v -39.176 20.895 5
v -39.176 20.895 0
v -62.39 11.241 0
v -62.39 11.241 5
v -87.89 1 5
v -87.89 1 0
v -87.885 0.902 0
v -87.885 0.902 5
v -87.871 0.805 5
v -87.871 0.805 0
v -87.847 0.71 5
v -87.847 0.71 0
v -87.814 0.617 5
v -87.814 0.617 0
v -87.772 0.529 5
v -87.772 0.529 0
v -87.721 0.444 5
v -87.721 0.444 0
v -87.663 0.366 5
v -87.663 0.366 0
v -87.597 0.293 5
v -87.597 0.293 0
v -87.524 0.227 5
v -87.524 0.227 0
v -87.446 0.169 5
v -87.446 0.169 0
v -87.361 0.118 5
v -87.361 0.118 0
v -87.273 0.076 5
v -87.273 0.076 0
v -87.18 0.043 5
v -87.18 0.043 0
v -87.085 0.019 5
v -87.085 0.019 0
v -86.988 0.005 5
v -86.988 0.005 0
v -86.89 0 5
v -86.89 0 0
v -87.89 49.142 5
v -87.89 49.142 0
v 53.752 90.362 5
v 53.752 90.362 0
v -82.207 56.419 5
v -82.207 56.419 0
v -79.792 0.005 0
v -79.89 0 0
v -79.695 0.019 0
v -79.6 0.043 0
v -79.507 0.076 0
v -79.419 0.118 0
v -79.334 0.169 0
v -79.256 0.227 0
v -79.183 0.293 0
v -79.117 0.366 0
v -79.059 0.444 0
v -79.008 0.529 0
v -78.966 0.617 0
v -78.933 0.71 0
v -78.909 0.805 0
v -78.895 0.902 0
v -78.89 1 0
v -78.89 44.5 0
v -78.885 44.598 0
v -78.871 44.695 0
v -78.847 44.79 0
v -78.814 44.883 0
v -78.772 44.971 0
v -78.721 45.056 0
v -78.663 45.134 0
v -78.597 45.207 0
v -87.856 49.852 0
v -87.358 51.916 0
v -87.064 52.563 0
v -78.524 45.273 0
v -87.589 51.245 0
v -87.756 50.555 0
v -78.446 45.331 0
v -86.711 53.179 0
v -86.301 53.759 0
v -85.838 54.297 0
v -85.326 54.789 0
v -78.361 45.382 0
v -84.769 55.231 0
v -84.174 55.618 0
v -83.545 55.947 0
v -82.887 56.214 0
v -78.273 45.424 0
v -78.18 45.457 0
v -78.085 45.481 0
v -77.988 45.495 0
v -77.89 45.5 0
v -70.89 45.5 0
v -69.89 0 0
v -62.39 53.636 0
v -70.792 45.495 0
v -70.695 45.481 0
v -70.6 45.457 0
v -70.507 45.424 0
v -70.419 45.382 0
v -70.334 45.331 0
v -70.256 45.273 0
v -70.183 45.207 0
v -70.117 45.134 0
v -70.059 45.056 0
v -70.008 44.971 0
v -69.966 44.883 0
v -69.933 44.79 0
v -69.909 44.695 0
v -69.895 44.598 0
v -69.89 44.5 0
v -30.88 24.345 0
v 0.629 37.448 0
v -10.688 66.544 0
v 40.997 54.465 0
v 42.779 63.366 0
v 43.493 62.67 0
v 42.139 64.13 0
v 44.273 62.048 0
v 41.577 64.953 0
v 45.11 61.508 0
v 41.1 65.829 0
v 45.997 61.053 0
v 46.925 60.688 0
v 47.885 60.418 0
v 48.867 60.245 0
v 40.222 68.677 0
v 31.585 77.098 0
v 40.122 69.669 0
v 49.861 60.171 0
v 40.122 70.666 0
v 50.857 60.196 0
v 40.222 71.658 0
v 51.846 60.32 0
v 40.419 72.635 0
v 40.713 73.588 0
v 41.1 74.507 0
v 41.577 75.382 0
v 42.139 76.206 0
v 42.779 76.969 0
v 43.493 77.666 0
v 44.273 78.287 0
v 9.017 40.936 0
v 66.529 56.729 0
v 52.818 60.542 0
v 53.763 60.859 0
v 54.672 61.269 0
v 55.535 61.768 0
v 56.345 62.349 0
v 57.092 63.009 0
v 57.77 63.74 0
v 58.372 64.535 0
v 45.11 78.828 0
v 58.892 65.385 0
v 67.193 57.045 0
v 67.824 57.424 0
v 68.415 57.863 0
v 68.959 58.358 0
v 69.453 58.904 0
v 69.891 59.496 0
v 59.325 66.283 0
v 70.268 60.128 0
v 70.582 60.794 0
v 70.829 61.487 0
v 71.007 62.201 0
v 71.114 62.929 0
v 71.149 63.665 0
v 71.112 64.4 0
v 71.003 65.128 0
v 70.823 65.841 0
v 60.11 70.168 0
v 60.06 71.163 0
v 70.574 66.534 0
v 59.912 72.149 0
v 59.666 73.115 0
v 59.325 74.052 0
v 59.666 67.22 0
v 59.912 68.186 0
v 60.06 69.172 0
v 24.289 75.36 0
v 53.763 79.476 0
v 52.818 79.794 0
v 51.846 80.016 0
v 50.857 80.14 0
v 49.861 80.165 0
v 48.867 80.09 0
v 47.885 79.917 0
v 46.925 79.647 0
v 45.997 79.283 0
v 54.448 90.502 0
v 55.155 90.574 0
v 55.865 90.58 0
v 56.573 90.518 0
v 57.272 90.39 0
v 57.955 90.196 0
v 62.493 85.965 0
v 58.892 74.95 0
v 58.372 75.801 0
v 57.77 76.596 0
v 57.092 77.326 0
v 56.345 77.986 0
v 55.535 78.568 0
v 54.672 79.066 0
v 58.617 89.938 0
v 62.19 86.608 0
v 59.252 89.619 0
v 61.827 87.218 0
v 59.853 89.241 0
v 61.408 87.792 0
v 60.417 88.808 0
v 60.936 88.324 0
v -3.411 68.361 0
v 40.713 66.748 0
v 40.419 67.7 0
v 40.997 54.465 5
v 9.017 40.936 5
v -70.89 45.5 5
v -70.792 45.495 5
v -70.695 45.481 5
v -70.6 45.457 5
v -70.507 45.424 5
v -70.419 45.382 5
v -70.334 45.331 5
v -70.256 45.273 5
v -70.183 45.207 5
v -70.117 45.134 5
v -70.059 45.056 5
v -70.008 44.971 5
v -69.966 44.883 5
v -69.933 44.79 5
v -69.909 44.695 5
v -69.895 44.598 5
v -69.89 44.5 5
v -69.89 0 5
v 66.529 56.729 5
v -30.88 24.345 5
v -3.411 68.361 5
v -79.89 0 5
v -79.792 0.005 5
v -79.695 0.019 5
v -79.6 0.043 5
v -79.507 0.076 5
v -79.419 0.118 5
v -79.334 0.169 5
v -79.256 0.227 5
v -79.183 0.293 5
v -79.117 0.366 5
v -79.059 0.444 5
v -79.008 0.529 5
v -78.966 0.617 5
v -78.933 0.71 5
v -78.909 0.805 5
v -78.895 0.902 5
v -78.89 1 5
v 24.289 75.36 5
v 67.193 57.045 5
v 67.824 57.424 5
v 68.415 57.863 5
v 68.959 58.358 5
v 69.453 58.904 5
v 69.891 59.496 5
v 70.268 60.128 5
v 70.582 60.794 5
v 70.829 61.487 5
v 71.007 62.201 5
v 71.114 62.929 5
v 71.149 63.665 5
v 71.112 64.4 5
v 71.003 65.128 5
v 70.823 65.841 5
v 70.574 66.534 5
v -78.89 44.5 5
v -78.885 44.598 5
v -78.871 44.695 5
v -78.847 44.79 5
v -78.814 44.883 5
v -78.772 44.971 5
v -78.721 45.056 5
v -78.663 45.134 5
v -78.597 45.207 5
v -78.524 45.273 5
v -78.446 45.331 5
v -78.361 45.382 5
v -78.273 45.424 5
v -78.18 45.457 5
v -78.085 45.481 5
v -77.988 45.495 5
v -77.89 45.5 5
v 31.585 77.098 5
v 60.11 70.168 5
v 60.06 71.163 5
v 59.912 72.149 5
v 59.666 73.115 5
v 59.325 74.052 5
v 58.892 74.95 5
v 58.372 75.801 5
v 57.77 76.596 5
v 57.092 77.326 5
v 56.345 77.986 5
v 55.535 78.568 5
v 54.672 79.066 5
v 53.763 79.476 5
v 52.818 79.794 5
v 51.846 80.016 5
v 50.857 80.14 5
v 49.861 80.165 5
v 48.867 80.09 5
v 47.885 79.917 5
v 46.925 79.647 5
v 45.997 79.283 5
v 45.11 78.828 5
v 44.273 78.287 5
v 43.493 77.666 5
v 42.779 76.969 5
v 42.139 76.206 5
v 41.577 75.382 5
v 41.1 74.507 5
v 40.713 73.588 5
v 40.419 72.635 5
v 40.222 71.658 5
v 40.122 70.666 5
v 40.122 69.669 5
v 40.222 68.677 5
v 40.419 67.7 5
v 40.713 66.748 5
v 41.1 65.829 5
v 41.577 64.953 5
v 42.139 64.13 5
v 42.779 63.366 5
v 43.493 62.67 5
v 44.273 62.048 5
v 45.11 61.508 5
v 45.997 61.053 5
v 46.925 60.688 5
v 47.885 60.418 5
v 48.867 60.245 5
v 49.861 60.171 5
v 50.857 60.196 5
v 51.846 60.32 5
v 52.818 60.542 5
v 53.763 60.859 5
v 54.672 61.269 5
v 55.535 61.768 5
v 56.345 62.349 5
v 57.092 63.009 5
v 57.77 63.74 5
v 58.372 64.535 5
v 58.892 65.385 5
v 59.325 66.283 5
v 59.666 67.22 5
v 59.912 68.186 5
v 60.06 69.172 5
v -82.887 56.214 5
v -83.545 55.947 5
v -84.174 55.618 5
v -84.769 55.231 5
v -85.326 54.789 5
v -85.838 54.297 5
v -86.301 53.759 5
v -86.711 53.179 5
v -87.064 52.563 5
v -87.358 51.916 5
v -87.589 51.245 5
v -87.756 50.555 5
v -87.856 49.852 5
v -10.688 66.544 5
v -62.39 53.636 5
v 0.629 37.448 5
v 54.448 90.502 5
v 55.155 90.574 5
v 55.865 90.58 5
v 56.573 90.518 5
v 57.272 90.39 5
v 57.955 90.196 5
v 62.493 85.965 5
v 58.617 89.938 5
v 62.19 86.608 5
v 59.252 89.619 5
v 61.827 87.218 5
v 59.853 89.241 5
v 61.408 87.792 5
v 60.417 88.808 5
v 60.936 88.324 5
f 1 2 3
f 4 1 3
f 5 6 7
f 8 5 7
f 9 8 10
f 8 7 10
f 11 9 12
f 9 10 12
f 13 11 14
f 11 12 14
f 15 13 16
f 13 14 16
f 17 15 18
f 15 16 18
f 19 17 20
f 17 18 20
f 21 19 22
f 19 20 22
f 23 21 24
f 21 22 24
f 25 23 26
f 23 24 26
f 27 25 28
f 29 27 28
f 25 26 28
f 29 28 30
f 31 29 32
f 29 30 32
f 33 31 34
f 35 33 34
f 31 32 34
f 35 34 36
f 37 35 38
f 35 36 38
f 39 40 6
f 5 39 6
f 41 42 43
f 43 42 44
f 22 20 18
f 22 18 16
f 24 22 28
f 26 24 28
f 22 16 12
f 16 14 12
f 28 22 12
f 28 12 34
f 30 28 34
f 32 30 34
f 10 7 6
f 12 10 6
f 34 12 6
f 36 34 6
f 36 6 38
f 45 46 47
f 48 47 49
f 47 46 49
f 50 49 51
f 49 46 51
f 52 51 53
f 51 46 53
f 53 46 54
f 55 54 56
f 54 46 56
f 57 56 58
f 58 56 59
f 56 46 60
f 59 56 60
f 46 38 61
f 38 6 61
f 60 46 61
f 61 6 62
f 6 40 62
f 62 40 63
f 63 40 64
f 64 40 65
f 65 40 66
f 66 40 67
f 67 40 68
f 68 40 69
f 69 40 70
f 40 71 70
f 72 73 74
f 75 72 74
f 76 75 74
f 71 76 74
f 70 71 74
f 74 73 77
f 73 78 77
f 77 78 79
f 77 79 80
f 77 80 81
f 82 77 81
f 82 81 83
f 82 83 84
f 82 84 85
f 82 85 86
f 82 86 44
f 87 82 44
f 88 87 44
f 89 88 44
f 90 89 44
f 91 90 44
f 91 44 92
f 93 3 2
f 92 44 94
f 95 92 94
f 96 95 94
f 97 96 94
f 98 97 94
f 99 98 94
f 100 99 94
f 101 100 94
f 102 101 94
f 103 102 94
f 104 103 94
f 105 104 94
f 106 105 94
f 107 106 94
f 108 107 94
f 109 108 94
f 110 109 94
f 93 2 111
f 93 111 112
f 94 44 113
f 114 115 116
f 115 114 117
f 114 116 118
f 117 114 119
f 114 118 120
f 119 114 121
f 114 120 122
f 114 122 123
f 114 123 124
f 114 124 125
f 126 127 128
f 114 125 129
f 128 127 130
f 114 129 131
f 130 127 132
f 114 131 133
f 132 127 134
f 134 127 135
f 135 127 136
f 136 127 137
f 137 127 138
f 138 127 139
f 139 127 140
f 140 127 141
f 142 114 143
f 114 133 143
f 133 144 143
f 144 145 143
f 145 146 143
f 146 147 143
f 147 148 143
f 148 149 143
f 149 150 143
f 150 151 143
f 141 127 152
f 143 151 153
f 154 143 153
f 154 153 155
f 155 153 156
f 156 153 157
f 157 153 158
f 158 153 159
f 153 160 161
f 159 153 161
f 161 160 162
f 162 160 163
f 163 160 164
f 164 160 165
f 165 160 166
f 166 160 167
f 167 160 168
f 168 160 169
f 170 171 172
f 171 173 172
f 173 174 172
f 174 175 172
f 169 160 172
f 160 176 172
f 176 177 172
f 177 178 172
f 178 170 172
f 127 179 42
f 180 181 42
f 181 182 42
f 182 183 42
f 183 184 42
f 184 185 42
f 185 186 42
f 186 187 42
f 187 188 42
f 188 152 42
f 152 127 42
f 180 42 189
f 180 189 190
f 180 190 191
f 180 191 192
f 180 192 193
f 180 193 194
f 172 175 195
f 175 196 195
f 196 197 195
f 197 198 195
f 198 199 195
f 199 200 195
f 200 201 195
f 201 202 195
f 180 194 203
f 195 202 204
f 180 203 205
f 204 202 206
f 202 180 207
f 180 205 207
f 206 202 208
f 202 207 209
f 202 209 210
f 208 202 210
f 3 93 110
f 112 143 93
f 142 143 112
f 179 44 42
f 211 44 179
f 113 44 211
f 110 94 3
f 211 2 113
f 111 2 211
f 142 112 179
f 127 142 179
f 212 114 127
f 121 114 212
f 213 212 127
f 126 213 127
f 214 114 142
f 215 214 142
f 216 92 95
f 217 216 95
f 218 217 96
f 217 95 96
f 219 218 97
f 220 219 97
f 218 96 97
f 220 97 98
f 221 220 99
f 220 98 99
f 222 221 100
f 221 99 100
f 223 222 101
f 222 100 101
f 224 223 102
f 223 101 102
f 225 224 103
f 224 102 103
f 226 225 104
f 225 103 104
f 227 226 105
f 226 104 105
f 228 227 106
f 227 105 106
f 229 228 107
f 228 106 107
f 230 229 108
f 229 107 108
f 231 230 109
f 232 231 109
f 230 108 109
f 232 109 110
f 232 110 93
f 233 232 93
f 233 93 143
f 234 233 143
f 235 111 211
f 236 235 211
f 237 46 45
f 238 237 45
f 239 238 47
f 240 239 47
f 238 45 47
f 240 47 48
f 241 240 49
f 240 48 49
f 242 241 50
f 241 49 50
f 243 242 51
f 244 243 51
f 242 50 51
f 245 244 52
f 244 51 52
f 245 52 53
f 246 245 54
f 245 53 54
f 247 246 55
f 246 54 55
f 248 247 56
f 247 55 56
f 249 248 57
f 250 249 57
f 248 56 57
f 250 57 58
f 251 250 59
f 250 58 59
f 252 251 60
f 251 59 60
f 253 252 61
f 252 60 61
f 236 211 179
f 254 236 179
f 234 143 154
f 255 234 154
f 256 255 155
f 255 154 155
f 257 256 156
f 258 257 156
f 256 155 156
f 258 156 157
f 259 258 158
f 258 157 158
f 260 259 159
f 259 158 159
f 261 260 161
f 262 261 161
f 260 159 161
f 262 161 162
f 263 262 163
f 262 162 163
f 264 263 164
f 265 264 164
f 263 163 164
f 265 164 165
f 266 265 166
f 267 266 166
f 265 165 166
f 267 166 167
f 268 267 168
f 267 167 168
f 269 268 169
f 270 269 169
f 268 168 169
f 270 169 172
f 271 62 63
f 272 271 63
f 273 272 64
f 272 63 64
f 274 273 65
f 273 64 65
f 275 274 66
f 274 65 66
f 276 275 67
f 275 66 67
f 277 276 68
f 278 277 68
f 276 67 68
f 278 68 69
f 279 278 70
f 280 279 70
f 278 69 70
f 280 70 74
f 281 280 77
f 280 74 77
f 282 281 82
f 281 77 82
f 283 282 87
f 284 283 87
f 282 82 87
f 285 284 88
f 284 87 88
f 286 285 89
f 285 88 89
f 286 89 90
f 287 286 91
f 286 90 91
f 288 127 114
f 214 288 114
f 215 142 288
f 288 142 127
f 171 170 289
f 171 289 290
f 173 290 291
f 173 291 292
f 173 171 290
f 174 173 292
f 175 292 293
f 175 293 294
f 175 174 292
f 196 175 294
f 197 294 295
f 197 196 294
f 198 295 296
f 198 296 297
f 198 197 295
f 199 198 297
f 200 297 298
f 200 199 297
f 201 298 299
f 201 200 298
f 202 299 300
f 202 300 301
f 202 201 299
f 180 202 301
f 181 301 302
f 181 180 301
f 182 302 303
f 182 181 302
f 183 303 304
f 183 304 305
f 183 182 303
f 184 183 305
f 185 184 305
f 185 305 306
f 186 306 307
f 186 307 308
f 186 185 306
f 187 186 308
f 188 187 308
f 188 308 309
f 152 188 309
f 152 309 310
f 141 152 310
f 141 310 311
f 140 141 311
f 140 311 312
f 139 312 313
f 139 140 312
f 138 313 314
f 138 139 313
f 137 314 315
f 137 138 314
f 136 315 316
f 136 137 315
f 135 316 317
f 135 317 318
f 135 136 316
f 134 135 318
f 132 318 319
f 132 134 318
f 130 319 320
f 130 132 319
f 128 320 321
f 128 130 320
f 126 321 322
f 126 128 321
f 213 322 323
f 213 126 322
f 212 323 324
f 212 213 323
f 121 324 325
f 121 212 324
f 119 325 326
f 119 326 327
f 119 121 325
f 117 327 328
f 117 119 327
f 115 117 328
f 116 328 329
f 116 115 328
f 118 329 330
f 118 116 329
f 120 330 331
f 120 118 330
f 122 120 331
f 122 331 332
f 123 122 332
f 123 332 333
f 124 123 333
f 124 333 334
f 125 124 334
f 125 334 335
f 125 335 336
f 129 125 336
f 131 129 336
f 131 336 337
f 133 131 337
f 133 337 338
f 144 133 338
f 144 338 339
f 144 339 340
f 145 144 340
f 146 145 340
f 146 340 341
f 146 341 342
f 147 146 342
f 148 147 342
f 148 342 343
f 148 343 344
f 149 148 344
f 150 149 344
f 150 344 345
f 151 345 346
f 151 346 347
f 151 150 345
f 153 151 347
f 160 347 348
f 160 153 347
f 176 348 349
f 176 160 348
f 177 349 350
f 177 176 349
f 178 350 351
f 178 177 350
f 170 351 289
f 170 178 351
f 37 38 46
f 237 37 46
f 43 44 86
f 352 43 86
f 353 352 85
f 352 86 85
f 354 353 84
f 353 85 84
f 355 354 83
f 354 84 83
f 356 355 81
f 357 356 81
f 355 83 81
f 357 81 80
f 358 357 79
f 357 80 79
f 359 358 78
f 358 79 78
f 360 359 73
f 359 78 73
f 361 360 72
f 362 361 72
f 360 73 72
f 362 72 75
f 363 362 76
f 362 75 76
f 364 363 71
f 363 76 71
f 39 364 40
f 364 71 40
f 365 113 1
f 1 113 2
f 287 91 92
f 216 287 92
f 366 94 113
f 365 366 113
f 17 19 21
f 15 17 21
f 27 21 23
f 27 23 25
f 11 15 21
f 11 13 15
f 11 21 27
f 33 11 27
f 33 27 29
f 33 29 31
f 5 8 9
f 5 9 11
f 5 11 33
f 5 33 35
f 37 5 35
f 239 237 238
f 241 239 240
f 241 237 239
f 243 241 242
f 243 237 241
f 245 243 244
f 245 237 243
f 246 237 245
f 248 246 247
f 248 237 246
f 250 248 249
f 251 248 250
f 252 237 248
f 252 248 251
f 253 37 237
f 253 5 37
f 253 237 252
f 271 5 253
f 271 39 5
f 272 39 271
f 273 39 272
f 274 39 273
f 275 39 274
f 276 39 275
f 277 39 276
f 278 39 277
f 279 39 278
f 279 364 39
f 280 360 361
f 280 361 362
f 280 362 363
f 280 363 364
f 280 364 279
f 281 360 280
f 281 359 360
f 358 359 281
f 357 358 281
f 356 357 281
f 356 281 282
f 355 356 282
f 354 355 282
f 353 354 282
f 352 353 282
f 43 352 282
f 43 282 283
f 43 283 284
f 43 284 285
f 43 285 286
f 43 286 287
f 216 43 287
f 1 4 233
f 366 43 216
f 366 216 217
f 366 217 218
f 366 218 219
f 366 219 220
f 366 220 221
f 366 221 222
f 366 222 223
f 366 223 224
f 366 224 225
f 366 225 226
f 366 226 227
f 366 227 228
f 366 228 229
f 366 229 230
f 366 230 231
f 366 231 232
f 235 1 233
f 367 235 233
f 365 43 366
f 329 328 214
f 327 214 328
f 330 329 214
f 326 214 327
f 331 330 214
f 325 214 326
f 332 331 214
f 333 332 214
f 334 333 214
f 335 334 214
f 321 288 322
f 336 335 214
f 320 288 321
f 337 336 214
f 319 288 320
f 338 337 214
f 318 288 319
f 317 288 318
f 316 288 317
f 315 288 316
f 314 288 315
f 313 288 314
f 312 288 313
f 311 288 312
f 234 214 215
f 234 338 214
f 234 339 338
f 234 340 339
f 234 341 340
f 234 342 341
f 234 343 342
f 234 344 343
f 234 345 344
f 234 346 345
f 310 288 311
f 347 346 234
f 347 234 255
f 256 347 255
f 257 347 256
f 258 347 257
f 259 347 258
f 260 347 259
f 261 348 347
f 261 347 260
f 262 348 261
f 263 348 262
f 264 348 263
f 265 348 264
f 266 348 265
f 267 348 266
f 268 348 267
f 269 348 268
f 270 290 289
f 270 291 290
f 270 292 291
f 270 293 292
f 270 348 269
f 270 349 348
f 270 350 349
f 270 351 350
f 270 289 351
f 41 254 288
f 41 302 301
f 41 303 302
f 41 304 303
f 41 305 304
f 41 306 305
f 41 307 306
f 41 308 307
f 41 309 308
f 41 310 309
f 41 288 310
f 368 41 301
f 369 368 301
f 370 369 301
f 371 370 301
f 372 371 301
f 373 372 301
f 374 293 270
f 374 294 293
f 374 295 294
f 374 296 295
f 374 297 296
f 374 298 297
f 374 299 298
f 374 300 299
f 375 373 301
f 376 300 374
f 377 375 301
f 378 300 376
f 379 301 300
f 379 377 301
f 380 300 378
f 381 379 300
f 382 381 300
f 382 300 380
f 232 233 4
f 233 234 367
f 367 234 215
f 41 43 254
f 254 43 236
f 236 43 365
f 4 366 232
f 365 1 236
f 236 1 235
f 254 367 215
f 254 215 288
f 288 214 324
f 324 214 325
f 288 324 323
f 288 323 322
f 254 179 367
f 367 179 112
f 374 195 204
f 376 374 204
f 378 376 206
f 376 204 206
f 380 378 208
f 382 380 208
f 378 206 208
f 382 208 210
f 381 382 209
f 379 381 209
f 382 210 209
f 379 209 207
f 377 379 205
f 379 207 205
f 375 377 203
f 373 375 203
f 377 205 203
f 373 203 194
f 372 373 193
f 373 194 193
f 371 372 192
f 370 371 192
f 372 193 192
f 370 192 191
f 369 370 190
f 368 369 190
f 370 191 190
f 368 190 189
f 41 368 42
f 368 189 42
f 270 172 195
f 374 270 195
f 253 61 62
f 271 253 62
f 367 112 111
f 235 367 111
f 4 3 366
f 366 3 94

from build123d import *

# Parameters (mm, degrees)
F0_R     = 10
F1_DEPTH = 5


with BuildPart() as f1:
    # F0 (on Top) → F1 (new body)
    with BuildSketch(Plane.XY):
        with BuildLine():
            ThreePointArc((-79.890026, 0), (-79.182919, 0.292893), (-78.890026, 1))
            Line((-78.890026, 1), (-78.890026, 44.5))
            ThreePointArc((-78.890026, 44.5), (-78.597133, 45.207107), (-77.890026, 45.5))
            Line((-77.890026, 45.5), (-70.890026, 45.5))
            ThreePointArc((-70.890026, 45.5), (-70.182919, 45.207107), (-69.890026, 44.5))
            Line((-69.890026, 44.5), (-69.890026, 0))
            Line((-69.890026, 0), (66.528554, 56.729136))
            ThreePointArc((66.528554, 56.729136), (70.581868, 60.793756), (70.573874, 66.534002))
            Line((70.573874, 66.534002), (62.493371, 85.965476))
            ThreePointArc((62.493371, 85.965476), (58.938302, 89.785922), (53.751584, 90.362352))
            Line((53.751584, 90.362352), (-82.20672, 56.418899))
            ThreePointArc((-82.20672, 56.418899), (-86.30083, 53.758785), (-87.890026, 49.142249))
            Line((-87.890026, 49.142249), (-87.890026, 1))
            ThreePointArc((-87.890026, 1), (-87.597133, 0.292893), (-86.890026, 0))
            Line((-86.890026, 0), (-79.890026, 0))
        make_face()
        Polygon((-62.390026, 53.636143), (-10.687523, 66.544229), (-39.176145, 20.894883), (-62.390026, 11.241481), align=None, mode=Mode.SUBTRACT)
        Polygon((-30.880324, 24.344668), (-3.410874, 68.360923), (24.289399, 75.359991), (0.629378, 37.447855), align=None, mode=Mode.SUBTRACT)
        Polygon((9.017346, 40.935959), (31.585224, 77.098076), (40.997005, 54.46523), align=None, mode=Mode.SUBTRACT)
        with Locations((50.109974, 70.167761)):
            Circle(F0_R, mode=Mode.SUBTRACT)
    extrude(amount=F1_DEPTH)


solid = f1.part
